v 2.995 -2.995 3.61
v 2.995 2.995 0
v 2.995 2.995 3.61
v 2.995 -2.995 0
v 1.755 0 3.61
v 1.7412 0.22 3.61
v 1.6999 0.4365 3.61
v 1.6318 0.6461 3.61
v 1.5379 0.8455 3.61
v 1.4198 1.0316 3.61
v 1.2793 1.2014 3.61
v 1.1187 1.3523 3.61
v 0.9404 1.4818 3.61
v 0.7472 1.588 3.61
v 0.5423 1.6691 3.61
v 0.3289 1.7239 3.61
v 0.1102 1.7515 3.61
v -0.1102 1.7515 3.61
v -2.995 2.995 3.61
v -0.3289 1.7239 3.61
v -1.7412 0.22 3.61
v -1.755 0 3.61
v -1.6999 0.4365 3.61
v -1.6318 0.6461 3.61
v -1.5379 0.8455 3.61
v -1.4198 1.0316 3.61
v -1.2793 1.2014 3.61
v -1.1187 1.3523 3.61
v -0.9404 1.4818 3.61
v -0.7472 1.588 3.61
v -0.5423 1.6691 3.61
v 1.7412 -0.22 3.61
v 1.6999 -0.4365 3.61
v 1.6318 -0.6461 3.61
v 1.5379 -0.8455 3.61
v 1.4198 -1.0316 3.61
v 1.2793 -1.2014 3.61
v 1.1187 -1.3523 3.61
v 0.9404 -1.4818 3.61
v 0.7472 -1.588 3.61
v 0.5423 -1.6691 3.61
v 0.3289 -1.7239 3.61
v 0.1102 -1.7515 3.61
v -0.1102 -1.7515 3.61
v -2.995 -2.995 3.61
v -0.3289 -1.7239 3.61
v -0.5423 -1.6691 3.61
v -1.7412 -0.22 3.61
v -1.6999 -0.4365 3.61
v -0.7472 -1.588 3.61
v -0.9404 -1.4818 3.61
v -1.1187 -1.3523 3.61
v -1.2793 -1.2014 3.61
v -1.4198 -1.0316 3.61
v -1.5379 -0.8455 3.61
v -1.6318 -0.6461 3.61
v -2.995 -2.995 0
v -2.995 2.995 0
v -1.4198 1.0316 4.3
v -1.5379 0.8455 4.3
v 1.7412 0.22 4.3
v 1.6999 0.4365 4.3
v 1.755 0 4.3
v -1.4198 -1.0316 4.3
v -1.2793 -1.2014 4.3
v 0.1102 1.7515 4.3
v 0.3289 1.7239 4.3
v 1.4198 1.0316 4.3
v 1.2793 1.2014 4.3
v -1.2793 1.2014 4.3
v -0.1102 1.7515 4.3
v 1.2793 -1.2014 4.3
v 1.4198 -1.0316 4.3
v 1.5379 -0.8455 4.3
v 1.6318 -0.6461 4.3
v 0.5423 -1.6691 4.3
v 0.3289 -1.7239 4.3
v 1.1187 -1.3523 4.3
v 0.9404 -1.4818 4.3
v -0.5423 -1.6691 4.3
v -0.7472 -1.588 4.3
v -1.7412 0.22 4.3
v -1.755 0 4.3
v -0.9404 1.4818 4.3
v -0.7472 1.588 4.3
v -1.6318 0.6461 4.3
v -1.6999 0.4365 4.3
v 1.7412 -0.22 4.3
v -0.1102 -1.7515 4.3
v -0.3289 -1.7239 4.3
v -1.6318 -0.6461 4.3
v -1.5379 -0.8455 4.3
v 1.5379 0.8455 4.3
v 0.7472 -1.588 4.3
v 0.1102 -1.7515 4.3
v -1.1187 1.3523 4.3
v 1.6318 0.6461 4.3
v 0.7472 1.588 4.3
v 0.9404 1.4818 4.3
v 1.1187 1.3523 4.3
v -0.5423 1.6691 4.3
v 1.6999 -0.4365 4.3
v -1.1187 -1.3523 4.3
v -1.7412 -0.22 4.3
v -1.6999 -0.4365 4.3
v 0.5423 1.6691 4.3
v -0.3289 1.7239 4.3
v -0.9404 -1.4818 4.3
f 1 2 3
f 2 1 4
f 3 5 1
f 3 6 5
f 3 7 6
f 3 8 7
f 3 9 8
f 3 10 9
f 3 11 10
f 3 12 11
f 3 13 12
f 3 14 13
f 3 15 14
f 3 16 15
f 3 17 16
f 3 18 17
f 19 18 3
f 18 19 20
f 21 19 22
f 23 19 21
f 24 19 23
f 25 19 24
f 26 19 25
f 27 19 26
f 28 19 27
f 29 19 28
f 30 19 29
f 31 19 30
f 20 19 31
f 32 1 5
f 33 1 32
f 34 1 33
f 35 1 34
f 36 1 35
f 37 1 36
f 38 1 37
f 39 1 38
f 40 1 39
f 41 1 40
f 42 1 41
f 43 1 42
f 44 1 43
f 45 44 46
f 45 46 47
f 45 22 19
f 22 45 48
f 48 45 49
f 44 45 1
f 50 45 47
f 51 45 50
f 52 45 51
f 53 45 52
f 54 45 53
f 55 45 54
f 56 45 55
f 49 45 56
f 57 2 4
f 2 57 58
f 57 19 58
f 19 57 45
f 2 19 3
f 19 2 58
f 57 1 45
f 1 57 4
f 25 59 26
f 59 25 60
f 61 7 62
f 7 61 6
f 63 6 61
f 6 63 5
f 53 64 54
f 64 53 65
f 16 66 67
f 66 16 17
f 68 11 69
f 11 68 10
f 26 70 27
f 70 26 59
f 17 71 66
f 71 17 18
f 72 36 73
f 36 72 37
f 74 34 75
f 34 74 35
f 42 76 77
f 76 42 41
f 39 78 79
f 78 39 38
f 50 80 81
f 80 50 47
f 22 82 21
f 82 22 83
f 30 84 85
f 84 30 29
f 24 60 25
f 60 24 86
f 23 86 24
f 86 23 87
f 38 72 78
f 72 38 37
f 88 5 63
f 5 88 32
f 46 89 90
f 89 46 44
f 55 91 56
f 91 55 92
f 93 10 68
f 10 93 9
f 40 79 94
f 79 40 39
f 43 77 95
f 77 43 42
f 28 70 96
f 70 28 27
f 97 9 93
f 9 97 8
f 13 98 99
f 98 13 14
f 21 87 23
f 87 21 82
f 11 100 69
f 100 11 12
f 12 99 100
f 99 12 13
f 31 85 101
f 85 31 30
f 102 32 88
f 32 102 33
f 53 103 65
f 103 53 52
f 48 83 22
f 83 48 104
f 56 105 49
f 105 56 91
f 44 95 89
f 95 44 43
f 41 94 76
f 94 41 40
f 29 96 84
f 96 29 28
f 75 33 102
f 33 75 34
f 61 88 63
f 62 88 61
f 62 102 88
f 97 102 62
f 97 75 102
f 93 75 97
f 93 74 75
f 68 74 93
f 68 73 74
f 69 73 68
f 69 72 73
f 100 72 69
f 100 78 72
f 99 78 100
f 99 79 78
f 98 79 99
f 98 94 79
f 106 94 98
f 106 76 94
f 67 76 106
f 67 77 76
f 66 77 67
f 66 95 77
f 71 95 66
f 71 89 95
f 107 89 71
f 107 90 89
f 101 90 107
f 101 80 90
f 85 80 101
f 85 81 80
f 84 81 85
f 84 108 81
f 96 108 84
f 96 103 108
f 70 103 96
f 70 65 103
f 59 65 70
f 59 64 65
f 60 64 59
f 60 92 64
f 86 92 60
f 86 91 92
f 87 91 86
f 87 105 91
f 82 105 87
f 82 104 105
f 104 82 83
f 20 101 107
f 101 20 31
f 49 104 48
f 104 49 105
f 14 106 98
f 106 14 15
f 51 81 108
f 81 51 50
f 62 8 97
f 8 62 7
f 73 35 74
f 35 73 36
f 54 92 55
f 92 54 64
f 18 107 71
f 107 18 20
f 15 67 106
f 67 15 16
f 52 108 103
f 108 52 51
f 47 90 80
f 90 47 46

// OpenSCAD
module button(){
    translate([-2.995, -2.995, 0]){
    cube([5.99, 5.99, 3.61]);
    }
    translate([0, 0, 3.3]){
       cylinder(2, 1.755, 1.755, true);
    }
}

$fn=50;

button();
